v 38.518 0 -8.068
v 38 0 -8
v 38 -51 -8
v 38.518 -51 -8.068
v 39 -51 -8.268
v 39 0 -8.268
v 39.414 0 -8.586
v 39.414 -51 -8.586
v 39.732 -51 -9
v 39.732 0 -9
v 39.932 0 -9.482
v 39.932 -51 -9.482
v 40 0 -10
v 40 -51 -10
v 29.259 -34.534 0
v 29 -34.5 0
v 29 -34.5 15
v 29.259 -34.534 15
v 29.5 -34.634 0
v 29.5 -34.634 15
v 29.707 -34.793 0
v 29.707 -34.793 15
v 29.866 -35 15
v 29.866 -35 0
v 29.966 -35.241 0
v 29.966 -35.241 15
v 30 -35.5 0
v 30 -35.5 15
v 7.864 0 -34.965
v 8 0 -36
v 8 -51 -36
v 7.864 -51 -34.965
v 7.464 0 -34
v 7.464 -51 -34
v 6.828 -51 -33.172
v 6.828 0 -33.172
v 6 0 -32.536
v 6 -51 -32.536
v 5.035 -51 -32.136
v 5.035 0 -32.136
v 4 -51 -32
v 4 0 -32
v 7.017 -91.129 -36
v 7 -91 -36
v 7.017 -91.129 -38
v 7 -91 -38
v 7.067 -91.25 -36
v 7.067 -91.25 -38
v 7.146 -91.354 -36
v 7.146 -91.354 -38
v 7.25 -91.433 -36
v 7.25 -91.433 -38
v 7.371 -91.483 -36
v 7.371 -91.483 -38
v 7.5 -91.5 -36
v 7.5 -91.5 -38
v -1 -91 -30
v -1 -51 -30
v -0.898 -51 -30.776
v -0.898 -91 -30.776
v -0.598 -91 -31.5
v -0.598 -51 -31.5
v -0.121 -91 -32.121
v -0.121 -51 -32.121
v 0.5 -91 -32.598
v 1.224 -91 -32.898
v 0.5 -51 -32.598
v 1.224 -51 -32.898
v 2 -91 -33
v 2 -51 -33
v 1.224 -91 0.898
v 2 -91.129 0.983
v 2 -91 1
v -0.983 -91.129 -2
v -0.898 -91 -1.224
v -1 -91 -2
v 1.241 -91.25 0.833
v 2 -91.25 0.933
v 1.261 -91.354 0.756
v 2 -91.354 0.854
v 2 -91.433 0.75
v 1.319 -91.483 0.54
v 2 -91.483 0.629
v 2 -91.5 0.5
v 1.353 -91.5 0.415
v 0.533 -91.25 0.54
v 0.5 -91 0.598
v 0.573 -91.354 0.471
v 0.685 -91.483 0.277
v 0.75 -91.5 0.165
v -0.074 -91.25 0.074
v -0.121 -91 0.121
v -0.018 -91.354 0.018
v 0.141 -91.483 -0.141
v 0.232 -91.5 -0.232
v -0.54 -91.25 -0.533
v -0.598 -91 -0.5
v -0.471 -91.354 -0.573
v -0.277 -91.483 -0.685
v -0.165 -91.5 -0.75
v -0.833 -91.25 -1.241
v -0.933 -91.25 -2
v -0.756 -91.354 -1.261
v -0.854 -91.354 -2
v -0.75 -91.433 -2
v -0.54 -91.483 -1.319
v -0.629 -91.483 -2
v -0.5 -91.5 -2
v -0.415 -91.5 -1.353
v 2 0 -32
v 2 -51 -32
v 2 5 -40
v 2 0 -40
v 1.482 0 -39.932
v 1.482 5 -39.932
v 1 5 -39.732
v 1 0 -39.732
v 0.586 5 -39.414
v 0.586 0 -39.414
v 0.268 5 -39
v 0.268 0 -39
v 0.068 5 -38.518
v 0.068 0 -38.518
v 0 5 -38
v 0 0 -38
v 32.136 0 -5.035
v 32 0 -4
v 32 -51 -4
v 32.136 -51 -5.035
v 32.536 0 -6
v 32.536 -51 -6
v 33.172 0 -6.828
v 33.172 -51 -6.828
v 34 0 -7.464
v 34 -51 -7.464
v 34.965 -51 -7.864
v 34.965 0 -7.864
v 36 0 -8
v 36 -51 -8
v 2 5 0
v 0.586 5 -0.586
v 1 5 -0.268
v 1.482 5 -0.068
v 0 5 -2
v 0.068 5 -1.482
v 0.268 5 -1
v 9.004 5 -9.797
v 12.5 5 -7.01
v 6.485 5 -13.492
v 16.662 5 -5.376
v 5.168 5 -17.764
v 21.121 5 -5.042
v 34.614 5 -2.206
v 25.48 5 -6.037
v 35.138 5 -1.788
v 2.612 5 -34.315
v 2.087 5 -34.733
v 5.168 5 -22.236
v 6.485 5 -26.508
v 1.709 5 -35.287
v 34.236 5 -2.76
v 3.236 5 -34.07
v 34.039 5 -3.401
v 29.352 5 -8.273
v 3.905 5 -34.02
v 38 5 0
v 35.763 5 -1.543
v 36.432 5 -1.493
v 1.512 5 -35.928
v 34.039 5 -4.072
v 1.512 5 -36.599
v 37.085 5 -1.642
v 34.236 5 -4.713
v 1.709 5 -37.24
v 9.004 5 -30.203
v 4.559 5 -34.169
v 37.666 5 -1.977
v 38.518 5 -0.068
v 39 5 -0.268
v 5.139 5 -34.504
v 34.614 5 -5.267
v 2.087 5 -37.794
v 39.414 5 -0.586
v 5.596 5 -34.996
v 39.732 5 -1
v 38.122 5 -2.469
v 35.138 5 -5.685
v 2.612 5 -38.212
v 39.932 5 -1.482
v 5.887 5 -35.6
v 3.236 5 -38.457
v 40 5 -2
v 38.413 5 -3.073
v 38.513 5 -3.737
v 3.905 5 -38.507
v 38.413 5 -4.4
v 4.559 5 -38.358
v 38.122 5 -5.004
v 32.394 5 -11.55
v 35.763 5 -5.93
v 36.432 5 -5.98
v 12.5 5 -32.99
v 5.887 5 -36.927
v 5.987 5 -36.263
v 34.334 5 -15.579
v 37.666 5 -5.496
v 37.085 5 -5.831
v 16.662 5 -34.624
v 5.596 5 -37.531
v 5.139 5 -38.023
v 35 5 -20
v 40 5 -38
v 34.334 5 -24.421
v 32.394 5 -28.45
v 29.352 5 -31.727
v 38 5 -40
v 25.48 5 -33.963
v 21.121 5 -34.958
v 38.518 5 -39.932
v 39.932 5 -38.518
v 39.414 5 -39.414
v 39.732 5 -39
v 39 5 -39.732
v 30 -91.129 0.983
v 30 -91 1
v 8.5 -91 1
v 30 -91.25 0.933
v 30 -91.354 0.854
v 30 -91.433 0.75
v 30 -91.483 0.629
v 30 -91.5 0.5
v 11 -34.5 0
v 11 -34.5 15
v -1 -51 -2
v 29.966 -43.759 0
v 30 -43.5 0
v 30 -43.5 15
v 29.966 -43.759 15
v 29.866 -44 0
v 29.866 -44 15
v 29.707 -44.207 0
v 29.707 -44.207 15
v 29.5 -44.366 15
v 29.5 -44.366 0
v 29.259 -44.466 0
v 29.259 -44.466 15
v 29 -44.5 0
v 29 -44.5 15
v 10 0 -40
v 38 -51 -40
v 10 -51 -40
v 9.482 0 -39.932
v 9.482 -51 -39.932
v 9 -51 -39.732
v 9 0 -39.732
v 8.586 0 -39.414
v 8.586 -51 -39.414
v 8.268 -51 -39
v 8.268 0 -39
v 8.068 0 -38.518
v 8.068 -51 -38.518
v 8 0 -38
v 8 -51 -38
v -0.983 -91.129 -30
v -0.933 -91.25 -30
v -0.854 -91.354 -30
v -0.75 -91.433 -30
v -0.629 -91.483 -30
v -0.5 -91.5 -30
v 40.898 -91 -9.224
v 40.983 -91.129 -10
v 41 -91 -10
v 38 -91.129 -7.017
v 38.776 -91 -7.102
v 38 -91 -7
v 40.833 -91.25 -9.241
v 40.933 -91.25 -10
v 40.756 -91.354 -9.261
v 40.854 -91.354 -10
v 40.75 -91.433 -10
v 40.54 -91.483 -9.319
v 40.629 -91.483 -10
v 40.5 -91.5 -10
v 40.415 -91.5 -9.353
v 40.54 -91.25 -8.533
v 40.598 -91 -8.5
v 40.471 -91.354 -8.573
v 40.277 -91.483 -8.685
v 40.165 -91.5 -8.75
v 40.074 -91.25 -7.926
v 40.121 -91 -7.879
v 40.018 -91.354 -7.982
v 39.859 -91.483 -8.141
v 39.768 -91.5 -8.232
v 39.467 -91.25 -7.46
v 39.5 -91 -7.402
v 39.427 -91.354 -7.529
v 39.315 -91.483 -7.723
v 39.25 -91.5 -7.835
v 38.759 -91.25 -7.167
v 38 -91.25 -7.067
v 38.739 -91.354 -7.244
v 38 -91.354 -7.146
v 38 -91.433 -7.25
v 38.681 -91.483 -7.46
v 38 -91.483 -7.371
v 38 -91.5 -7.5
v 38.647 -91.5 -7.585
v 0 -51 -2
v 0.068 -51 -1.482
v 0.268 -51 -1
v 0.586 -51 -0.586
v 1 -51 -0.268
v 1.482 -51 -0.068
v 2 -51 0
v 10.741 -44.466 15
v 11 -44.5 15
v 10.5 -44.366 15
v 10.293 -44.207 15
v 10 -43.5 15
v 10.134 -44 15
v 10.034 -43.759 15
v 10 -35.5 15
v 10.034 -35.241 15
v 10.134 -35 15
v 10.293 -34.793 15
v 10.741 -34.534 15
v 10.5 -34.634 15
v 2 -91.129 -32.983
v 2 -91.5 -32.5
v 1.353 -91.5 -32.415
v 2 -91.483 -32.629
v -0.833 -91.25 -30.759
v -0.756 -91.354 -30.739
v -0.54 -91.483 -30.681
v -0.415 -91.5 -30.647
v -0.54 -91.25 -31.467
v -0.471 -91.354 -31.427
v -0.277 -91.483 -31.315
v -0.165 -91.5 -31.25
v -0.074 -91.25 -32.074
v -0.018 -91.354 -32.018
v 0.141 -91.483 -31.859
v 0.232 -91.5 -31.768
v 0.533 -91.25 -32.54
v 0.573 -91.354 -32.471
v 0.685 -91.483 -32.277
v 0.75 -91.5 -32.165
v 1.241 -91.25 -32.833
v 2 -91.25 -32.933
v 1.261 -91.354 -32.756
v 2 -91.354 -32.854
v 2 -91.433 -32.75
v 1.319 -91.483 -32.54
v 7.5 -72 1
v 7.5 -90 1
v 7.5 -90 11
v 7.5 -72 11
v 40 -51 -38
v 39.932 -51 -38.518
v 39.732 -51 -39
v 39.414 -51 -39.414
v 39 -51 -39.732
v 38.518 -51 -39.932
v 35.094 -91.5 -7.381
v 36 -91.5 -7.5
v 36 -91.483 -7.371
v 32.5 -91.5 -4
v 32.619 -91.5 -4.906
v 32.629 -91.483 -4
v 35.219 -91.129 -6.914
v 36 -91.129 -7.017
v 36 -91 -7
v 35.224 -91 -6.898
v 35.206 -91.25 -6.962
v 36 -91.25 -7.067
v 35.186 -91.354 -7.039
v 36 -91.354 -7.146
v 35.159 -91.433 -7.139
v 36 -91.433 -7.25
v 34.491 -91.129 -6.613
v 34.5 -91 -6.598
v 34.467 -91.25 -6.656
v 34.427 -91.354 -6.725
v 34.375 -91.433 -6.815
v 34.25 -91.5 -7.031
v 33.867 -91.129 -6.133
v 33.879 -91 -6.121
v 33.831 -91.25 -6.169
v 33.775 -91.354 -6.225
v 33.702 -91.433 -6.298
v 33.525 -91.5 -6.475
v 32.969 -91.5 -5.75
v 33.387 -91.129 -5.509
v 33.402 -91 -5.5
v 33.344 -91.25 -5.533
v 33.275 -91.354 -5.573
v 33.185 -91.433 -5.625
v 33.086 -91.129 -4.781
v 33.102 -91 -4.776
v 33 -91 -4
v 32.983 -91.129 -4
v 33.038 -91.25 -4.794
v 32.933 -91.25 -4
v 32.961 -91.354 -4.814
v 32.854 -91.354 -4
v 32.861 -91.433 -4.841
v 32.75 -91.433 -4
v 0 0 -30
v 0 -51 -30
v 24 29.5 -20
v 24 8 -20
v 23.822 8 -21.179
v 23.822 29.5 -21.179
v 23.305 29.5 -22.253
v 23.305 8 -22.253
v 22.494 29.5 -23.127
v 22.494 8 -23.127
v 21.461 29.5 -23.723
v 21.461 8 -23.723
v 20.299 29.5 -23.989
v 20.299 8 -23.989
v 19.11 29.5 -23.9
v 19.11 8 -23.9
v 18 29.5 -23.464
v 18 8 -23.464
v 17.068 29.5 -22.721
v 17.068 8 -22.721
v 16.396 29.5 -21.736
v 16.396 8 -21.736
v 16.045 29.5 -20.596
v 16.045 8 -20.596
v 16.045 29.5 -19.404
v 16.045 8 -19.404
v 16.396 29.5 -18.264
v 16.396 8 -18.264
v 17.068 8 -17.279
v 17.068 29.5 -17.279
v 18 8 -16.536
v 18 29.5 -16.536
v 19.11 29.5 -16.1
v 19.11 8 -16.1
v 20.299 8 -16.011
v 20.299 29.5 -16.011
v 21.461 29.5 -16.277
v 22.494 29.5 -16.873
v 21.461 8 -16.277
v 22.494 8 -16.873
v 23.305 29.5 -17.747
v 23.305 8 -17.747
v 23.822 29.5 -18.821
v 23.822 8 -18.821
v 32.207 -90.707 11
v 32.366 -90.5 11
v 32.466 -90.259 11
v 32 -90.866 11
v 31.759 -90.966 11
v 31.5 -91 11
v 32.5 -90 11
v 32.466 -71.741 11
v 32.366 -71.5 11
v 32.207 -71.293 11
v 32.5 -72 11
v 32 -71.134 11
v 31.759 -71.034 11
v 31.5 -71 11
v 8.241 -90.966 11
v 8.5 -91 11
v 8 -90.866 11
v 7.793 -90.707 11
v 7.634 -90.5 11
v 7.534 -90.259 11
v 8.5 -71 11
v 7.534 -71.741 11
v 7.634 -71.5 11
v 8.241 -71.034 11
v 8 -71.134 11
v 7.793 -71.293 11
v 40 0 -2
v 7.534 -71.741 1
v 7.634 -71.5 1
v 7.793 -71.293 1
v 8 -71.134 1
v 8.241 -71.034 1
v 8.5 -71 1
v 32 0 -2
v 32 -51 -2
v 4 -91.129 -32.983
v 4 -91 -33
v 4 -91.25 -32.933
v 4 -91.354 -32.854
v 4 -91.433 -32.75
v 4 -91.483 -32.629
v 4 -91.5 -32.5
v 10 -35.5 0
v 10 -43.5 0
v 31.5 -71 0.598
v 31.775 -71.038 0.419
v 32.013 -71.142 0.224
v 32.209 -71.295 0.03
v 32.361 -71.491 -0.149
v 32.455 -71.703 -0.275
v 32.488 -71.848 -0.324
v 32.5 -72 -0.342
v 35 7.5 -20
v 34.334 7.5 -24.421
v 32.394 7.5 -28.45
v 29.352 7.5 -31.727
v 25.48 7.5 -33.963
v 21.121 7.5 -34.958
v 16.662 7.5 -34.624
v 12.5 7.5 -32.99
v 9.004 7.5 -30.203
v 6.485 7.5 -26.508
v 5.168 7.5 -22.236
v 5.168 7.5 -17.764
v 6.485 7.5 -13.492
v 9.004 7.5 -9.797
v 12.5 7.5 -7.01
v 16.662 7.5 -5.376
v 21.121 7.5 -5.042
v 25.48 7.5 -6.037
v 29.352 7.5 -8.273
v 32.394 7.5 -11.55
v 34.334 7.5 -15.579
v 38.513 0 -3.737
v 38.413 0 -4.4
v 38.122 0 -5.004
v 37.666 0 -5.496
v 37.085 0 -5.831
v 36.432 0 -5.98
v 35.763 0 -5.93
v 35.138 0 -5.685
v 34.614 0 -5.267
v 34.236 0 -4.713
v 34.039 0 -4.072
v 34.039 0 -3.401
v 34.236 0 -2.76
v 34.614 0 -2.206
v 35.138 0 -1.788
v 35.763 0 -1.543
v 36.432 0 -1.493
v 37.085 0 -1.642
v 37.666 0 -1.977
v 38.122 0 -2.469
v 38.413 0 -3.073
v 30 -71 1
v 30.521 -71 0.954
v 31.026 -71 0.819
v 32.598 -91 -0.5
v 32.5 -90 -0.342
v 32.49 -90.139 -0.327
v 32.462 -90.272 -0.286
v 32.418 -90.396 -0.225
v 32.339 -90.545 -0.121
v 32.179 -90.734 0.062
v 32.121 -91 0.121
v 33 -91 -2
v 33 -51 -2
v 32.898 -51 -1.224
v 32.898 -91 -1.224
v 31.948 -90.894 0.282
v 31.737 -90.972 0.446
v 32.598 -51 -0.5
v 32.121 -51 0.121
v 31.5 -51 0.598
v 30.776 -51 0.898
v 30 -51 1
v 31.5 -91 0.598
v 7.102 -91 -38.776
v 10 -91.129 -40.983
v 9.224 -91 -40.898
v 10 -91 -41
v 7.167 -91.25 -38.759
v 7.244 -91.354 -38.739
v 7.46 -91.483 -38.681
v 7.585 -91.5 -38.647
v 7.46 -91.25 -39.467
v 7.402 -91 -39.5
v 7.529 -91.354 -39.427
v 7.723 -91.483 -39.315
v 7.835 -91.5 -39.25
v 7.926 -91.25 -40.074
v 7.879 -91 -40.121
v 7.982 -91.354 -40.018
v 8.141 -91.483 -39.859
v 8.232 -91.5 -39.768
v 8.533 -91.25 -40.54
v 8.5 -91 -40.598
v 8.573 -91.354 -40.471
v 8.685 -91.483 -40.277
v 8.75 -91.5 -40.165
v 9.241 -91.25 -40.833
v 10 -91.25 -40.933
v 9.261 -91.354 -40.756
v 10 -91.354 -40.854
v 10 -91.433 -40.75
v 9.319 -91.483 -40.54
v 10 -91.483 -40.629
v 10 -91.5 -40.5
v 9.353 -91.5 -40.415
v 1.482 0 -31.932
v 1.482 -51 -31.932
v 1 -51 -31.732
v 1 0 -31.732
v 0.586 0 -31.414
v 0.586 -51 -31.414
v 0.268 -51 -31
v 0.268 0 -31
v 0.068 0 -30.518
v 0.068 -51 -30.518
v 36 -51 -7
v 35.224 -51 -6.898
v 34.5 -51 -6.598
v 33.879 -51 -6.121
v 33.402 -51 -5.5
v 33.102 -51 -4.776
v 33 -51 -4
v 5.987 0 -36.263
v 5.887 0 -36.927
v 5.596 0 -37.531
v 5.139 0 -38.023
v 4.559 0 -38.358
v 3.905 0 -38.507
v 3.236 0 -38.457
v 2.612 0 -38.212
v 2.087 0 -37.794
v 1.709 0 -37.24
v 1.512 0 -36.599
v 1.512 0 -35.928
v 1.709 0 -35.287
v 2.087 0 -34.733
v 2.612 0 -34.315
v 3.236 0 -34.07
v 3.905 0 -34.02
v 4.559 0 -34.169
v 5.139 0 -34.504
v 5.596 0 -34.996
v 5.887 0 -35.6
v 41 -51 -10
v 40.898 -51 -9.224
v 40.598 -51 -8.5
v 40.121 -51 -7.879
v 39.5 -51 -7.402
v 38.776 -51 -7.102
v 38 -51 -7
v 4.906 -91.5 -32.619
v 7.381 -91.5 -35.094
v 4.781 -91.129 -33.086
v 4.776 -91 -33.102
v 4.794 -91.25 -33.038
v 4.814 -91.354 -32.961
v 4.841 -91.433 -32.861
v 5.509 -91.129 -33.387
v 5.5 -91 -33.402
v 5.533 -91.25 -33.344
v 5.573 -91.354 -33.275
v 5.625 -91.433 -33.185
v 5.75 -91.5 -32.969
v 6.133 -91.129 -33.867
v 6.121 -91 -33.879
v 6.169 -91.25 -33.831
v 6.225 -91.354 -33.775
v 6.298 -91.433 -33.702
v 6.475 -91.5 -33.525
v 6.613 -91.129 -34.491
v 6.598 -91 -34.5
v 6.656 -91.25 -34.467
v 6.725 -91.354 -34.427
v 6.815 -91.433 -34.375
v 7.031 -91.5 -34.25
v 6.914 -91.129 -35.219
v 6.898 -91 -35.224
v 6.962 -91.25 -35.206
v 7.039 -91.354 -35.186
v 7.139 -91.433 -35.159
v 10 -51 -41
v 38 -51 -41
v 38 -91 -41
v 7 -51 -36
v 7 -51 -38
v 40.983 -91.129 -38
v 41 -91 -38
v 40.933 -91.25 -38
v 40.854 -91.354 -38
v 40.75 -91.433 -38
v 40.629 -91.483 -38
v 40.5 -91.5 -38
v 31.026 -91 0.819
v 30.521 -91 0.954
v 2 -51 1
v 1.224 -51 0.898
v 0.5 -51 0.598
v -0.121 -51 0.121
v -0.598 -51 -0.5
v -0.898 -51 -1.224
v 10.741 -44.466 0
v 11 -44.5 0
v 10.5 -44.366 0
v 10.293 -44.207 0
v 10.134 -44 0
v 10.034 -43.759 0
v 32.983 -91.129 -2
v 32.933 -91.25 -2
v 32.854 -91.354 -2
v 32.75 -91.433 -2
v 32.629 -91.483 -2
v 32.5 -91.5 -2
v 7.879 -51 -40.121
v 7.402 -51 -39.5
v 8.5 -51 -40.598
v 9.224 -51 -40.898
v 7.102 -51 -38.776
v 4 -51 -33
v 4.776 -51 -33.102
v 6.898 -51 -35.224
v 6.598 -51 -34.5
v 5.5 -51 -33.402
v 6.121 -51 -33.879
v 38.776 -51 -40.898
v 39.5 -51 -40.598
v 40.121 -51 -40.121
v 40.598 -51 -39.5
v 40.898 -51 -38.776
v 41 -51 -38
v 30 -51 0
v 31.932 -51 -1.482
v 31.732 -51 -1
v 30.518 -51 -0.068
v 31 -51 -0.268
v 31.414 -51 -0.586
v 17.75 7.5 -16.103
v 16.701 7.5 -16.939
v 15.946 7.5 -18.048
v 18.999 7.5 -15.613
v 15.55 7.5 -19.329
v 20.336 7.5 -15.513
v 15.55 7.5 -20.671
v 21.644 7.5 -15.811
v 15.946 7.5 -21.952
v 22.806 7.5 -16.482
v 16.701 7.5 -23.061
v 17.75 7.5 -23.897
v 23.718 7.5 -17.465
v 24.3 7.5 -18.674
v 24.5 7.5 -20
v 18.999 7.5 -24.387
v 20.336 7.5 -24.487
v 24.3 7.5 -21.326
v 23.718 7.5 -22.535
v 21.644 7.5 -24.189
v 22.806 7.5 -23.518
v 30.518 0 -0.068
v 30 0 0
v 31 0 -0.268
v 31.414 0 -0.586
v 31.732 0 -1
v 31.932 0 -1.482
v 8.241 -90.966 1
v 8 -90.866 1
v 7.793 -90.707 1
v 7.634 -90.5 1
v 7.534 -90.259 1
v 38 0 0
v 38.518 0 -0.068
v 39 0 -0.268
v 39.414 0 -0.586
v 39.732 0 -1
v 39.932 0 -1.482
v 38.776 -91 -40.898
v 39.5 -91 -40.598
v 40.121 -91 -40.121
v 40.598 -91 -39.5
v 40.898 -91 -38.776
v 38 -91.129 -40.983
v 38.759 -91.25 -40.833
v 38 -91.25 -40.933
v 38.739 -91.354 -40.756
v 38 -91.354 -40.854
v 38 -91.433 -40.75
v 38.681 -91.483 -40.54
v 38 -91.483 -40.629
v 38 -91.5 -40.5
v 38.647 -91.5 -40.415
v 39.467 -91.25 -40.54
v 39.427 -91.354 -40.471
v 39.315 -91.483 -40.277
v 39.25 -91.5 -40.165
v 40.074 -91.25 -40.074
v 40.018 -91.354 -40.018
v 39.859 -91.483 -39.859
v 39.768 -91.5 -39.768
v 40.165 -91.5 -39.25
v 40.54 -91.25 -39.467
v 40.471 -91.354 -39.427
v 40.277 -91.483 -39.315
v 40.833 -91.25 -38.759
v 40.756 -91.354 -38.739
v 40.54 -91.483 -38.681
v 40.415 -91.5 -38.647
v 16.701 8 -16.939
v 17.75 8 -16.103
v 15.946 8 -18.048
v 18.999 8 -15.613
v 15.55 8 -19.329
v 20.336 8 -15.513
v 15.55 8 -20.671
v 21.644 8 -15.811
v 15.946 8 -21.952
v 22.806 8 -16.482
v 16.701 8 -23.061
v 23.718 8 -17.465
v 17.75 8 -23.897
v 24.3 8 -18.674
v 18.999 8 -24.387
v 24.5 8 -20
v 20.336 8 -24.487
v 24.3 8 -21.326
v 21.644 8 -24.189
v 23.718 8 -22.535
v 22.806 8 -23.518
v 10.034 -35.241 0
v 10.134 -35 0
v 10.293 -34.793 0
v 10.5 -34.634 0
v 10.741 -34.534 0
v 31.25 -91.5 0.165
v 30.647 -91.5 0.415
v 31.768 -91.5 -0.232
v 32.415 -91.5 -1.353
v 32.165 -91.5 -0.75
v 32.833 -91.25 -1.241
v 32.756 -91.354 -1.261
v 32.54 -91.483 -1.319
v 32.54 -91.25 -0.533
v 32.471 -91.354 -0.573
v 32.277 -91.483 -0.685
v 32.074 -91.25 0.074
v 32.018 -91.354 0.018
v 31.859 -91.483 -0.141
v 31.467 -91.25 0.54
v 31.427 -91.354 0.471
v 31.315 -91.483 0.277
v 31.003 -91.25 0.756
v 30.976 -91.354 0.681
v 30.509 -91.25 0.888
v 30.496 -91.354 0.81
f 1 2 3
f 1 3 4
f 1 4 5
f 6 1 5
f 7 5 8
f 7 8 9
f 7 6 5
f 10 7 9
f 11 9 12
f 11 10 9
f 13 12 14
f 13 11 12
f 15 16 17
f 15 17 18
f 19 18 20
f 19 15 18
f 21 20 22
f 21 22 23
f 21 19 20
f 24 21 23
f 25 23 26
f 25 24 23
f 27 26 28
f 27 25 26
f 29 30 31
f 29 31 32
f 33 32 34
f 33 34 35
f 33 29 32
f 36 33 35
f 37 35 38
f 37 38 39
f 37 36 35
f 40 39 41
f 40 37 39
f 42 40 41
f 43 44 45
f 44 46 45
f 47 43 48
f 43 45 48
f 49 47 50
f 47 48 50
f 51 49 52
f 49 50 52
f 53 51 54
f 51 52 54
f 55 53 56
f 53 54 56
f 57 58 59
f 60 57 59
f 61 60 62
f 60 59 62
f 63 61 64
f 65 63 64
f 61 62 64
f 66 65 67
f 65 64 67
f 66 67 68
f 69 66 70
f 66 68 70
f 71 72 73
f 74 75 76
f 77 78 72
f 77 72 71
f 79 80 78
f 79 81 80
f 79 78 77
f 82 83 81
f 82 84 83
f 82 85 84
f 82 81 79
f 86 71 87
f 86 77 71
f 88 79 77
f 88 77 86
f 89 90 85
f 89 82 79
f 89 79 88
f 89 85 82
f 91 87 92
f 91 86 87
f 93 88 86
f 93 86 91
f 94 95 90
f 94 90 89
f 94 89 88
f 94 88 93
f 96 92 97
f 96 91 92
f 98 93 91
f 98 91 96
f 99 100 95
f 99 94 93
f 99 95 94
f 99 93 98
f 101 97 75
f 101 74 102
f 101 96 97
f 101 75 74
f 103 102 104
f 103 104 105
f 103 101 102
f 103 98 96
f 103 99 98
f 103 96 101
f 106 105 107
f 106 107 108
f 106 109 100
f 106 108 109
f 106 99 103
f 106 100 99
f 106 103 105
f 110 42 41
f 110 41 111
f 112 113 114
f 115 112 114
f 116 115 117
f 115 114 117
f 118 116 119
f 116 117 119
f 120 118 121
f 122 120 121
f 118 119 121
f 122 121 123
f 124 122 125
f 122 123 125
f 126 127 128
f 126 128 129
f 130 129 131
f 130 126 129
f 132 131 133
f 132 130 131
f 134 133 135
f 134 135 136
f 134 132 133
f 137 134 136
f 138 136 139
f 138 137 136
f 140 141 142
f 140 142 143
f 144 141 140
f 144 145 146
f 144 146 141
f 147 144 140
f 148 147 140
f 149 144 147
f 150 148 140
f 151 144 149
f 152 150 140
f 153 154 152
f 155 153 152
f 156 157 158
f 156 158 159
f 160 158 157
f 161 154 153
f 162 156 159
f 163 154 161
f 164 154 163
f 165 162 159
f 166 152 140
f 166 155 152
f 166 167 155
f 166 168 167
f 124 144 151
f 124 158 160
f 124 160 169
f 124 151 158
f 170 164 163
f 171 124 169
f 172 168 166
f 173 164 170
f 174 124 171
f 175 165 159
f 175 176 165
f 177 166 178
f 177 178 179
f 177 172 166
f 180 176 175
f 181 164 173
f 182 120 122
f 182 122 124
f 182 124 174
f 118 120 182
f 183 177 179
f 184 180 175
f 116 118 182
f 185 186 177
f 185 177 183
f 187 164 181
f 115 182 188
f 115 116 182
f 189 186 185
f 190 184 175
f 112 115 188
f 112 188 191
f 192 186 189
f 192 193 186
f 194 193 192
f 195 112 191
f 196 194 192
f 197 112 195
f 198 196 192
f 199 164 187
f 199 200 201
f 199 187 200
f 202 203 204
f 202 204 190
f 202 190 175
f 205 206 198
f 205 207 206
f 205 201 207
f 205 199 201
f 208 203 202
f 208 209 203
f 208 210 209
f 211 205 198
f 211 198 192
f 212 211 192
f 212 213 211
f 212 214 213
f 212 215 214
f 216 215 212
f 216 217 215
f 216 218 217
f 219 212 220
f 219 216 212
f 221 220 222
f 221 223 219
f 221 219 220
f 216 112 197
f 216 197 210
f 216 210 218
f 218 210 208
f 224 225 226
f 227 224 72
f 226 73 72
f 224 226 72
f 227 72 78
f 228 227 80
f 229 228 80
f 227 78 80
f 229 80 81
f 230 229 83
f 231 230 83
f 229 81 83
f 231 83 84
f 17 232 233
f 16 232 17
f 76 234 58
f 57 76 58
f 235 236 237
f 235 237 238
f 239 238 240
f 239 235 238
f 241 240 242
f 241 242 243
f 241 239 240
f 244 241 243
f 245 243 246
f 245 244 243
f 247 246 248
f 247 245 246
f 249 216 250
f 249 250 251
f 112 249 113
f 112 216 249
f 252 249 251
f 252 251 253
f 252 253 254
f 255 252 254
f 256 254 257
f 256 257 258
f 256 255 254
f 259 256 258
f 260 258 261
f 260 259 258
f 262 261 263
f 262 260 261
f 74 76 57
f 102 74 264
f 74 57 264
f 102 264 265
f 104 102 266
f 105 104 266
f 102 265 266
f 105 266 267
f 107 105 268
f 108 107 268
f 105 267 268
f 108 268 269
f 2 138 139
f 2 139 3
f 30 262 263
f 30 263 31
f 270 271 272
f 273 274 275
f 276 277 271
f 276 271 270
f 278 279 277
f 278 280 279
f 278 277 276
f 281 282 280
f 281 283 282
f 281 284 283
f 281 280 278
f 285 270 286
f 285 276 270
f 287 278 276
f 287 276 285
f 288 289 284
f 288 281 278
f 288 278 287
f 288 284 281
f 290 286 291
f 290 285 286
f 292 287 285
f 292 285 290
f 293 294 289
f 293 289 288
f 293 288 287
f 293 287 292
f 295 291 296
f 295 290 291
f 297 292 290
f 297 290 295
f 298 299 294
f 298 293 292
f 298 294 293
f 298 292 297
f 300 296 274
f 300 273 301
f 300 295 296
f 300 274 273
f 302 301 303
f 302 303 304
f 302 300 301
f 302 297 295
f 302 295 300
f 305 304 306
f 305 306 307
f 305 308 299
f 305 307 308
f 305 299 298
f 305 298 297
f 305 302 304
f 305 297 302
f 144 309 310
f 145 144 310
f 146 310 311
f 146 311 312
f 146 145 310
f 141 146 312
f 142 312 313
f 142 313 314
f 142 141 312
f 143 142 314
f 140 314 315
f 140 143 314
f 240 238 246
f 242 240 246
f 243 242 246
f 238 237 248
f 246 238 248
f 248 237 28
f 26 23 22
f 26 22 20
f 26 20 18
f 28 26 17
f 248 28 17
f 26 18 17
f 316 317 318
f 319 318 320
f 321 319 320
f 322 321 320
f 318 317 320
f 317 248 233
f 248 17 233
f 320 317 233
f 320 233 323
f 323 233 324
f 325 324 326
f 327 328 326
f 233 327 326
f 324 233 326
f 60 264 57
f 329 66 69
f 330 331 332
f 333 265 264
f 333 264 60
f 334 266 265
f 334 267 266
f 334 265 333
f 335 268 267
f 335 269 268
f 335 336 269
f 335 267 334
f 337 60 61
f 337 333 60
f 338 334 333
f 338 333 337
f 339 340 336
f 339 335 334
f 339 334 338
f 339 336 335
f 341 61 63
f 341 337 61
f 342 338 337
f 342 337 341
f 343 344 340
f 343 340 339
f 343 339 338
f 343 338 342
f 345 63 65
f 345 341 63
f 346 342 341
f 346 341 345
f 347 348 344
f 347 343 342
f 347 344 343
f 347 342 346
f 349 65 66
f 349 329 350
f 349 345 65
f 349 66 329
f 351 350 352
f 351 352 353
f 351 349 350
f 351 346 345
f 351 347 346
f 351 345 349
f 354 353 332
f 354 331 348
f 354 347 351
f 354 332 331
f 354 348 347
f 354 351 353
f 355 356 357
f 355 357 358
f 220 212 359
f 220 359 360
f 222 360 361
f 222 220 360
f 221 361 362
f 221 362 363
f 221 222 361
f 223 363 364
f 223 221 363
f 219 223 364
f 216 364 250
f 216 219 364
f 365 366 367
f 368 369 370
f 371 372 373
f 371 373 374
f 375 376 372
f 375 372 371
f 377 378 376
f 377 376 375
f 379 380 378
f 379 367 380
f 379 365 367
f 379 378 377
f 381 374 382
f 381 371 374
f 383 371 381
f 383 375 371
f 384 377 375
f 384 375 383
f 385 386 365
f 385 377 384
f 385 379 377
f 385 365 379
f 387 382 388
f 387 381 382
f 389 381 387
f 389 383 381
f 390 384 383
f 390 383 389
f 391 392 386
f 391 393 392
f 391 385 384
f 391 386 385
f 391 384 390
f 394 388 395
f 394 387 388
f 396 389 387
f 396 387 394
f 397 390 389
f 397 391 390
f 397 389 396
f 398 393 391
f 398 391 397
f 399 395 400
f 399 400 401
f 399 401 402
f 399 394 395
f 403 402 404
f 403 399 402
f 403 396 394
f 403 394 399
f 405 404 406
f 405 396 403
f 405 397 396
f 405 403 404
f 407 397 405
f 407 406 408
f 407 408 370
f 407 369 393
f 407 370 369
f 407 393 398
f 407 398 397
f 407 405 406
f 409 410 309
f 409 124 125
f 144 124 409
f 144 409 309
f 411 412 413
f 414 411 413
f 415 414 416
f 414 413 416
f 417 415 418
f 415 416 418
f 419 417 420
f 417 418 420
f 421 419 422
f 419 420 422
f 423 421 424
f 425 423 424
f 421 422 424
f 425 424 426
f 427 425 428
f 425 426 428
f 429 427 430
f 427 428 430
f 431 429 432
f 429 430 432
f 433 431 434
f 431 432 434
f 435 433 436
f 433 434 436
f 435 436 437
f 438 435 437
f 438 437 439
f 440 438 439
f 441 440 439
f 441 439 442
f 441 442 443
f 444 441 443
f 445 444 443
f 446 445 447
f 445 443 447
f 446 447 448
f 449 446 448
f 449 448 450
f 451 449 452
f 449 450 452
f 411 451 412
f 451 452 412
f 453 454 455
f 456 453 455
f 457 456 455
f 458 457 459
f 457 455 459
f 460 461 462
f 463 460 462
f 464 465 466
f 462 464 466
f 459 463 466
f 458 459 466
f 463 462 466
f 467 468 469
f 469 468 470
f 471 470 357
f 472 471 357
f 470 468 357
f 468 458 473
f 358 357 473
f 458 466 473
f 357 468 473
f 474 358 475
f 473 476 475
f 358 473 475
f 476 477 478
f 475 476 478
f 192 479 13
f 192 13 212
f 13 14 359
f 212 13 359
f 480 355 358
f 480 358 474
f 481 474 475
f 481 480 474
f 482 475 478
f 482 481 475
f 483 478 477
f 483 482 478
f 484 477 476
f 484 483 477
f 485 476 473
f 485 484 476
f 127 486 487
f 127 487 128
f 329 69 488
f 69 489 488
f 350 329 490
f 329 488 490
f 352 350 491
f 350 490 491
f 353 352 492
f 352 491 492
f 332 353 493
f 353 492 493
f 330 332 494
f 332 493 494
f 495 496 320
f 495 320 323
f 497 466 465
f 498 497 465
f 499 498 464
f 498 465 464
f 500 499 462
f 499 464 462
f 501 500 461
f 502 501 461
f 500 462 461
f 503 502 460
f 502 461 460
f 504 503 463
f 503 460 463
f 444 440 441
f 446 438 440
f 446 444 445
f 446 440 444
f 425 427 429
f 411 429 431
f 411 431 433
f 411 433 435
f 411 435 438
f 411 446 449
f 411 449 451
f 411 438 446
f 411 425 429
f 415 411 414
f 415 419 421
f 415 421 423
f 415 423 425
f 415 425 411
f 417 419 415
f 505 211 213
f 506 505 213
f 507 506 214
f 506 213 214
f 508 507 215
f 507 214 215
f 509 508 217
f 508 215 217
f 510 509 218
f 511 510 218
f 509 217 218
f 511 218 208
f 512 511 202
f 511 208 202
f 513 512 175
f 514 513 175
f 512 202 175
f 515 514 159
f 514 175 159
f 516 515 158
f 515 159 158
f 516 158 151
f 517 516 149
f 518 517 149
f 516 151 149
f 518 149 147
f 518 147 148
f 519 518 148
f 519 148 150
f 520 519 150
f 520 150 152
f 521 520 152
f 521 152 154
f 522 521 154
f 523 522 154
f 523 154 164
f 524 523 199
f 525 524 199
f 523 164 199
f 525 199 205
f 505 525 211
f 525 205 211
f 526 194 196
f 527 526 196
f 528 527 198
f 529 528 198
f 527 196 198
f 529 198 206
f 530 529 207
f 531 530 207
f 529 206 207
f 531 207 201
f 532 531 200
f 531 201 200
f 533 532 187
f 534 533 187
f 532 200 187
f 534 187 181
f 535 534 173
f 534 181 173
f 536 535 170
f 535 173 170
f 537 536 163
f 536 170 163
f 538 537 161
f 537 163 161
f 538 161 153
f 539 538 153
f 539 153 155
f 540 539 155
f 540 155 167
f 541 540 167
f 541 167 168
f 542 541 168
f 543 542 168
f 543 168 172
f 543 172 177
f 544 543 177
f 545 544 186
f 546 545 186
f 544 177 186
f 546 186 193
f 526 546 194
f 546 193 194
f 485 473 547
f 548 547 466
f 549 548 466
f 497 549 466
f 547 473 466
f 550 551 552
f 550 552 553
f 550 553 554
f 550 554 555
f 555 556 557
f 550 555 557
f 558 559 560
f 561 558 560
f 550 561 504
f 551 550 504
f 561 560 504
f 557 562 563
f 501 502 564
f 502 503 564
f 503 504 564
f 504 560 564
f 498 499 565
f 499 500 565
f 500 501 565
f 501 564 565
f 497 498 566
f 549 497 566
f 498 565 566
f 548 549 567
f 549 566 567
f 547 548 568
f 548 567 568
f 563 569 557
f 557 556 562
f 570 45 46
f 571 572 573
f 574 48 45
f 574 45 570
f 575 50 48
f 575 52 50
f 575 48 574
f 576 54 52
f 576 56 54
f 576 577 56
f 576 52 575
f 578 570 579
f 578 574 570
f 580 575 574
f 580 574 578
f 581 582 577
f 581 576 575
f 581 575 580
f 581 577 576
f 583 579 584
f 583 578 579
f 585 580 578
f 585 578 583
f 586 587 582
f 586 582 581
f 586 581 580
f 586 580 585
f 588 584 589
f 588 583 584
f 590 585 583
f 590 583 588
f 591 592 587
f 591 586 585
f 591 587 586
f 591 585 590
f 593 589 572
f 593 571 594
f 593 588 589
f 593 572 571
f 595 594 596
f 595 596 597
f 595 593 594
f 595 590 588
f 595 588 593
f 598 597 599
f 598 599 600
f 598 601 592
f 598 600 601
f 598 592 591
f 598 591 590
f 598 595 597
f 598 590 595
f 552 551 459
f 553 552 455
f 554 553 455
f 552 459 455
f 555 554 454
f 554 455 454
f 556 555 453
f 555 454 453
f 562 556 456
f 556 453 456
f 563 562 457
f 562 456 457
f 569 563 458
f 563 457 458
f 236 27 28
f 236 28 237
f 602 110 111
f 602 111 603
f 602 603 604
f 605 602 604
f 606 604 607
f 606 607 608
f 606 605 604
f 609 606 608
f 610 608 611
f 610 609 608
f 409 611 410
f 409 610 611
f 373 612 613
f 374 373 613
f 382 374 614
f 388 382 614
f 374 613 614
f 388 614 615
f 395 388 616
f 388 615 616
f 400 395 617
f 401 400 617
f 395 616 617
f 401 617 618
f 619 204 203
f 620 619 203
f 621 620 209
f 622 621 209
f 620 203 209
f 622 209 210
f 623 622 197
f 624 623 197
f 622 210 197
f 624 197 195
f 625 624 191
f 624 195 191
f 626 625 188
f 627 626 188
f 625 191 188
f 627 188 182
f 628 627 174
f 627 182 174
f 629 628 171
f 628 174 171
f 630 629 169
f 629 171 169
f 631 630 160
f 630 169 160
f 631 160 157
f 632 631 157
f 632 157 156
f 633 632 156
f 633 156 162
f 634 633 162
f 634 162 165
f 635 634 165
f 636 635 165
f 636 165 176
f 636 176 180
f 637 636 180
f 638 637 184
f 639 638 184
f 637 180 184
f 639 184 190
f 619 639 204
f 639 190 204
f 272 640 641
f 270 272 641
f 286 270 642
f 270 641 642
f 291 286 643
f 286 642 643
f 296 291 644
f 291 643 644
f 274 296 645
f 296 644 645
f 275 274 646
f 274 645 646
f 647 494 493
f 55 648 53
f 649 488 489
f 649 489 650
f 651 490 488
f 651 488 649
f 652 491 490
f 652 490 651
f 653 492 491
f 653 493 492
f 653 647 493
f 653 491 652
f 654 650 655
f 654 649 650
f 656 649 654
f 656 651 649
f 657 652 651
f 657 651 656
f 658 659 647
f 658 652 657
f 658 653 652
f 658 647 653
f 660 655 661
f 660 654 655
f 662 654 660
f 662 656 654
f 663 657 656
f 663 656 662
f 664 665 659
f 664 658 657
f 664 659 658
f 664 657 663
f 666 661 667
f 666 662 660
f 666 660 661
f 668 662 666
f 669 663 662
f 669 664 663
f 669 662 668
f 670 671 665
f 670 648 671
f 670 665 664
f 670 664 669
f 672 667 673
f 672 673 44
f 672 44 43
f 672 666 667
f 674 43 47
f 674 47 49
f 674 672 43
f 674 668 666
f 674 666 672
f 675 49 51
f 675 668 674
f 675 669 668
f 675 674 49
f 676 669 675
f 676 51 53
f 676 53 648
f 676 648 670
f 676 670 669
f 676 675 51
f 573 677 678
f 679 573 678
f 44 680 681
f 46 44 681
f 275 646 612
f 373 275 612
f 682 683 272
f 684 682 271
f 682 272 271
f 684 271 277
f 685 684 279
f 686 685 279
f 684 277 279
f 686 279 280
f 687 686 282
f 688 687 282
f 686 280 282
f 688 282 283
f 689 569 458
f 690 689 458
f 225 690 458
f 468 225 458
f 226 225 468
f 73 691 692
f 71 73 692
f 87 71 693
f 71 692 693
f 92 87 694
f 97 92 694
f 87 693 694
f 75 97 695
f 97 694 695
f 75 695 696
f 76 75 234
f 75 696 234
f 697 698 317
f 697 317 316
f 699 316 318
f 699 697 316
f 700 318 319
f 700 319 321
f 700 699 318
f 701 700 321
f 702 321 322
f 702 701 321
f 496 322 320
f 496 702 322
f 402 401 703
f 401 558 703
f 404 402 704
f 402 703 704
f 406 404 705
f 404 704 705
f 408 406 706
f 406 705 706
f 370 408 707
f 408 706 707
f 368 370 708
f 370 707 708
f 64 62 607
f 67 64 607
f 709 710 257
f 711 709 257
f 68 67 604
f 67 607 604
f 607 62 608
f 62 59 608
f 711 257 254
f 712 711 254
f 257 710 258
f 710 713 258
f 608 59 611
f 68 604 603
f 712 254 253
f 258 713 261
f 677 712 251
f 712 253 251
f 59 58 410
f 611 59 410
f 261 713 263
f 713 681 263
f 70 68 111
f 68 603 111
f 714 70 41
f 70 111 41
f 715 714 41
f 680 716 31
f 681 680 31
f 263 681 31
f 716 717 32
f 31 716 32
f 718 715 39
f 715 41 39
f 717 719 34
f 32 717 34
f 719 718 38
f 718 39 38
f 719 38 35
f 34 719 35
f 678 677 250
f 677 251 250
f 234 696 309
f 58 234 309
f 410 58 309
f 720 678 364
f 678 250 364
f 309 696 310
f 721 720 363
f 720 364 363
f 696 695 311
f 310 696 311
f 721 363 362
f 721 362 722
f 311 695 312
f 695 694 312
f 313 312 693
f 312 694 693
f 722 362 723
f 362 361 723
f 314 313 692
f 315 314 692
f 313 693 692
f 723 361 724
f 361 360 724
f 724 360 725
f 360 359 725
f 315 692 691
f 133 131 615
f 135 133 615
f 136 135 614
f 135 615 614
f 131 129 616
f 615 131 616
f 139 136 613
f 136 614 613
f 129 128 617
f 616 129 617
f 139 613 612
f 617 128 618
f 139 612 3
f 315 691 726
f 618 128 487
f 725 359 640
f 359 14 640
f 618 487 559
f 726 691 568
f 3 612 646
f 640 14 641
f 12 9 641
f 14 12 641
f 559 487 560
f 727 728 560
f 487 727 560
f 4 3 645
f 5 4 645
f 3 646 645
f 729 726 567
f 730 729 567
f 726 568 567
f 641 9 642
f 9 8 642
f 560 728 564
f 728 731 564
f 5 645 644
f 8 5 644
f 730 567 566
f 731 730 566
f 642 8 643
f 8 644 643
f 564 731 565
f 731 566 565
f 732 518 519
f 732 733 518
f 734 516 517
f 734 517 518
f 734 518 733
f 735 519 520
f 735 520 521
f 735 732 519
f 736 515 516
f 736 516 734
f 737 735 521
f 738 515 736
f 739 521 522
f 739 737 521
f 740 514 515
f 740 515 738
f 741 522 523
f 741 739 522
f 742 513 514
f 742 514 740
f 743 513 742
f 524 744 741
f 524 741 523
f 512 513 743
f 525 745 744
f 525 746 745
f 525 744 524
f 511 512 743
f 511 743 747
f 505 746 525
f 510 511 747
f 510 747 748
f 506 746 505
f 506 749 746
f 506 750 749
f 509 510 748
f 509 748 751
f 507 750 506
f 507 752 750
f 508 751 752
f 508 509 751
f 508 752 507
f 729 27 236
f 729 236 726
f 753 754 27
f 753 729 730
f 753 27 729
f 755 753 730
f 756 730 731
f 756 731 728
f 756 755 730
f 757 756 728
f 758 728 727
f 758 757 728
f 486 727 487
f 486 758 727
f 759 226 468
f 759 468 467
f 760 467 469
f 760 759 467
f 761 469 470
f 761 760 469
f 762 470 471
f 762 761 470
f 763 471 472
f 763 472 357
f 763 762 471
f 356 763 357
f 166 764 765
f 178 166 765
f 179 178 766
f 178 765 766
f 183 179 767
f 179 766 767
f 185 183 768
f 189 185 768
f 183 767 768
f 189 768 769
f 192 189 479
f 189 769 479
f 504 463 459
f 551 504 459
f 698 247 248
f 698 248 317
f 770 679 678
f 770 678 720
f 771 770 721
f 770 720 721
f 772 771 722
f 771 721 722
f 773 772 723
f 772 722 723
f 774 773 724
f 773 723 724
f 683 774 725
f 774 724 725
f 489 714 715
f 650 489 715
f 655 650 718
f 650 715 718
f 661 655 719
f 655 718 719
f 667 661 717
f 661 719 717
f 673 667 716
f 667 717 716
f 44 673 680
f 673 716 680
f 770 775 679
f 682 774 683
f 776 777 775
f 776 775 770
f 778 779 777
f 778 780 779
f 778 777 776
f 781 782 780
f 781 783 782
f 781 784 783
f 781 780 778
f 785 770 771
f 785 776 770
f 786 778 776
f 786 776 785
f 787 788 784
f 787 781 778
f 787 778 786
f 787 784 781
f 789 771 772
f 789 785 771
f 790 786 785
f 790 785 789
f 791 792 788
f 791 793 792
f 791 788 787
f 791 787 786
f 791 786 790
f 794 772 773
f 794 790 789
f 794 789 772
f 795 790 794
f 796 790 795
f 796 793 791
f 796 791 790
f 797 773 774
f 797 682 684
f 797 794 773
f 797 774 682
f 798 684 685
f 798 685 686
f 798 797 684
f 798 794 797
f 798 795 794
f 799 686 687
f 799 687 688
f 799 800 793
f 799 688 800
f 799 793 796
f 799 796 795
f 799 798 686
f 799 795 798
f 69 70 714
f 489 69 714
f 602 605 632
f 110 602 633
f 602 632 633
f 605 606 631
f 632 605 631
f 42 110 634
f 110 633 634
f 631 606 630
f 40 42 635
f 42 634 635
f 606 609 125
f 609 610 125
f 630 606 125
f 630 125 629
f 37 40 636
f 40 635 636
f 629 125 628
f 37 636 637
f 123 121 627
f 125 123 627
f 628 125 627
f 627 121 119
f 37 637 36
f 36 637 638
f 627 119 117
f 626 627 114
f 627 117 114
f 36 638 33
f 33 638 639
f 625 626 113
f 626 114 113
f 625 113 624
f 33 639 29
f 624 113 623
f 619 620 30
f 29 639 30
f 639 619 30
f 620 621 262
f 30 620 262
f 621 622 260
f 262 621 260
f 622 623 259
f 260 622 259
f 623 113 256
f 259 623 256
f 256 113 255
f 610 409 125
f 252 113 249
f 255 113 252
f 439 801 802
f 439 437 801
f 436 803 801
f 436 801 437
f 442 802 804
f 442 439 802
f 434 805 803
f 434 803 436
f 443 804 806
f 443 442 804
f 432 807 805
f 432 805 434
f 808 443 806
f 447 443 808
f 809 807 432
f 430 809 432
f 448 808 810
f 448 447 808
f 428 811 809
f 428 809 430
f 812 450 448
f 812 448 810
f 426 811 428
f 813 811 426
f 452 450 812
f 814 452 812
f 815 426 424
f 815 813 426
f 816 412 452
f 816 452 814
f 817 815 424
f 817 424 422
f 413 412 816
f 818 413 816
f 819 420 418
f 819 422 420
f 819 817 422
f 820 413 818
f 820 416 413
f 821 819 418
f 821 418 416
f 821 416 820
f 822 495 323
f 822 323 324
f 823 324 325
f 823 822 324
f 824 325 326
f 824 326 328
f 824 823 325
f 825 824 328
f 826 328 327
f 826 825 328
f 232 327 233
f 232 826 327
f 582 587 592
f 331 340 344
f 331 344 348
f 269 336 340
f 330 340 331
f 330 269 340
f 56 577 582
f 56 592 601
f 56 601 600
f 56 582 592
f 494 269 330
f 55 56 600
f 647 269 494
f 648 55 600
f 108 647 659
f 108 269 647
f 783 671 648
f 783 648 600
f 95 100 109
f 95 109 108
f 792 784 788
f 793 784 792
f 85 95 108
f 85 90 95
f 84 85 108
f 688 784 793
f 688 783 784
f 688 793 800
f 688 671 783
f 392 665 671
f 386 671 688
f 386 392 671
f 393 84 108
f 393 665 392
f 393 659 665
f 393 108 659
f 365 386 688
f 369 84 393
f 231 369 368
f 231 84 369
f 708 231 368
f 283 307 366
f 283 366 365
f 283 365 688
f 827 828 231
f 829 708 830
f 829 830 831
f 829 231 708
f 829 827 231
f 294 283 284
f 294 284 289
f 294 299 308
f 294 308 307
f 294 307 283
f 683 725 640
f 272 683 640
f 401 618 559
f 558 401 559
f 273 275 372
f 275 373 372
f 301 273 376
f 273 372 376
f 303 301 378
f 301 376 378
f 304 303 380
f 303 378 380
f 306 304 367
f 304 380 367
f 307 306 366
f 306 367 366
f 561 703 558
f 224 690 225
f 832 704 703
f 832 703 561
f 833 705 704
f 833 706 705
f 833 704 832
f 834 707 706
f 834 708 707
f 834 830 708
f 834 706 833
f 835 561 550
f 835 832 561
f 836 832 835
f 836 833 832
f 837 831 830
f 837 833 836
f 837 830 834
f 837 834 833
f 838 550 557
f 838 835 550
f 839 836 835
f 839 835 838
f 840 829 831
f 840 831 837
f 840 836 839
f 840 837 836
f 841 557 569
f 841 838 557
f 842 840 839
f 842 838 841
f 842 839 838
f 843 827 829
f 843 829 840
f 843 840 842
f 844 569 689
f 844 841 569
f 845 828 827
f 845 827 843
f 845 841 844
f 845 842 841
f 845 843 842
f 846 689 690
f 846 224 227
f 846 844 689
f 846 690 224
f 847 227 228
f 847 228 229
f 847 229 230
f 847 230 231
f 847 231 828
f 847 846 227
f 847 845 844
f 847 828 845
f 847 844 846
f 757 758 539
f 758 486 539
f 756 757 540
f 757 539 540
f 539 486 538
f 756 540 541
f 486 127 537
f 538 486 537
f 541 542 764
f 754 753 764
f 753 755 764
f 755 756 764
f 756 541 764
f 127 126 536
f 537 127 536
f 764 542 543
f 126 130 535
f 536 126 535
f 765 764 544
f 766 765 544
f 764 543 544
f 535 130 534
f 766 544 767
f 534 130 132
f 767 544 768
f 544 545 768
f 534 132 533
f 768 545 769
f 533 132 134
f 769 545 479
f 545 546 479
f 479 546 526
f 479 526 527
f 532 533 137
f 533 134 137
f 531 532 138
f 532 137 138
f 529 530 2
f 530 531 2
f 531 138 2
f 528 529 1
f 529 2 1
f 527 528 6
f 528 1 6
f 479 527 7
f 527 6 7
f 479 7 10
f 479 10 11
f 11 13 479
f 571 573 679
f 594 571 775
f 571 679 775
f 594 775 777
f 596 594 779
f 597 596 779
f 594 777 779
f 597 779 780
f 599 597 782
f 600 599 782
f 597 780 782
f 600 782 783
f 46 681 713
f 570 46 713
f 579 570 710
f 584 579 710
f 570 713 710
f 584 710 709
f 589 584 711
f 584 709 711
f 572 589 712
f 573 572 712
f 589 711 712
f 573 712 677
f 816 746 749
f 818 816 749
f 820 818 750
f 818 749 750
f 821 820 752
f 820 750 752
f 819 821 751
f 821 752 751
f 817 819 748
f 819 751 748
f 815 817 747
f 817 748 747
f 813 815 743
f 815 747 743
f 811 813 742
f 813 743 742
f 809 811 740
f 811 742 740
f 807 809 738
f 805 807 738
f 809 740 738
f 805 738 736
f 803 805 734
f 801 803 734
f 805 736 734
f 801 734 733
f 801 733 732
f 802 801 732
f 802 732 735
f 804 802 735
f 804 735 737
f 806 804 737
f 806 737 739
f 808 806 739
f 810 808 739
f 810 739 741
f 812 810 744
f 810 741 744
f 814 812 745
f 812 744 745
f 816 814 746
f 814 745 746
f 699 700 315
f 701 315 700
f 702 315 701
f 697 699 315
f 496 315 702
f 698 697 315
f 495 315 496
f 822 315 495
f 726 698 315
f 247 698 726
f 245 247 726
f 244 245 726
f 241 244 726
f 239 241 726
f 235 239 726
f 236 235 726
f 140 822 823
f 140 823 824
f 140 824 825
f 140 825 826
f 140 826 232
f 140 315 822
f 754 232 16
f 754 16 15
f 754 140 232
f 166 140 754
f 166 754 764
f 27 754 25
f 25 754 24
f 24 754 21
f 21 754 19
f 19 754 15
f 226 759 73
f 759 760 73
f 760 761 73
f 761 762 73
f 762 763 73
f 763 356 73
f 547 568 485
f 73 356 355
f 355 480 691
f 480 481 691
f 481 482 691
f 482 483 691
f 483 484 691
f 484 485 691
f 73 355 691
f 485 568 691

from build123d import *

# Parameters (mm, degrees)
BOSS_EXTRUDE1_DEPTH             = 5
SKETCH2_R                       = 15
BOSS_EXTRUDE2_DEPTH             = 2.5
SKETCH3_R                       = 2.25
CUT_EXTRUDE1_DEPTH              = 5
BOSS_EXTRUDE3_DEPTH             = 51
BOSS_EXTRUDE4_DEPTH             = 40.5
SKETCH6_R                       = 4.5
BOSS_EXTRUDE5_DEPTH             = 0.5
SKETCH7_R                       = 4
BOSS_EXTRUDE6_DEPTH             = 21.5
FILLET1_R                       = 0.5
BOSS_EXTRUDE7_DEPTH             = 15
BOSS_EXTRUDE8_DEPTH             = 10
BOSS_EXTRUDE8_DIRECTION_2_REACH = 44


with BuildPart() as part:
    # Sketch1 → Boss-Extrude1 (new body)
    with BuildSketch(Plane(origin=(0, 0, 0), x_dir=(1, 0, 0), z_dir=(0, 1, 0))):
        with BuildLine():
            Line((2, 0), (38, 0))
            ThreePointArc((38, 0), (39.414213562, 0.585786438), (40, 2))
            Line((40, 2), (40, 38))
            ThreePointArc((40, 38), (39.414213562, 39.414213562), (38, 40))
            Line((38, 40), (2, 40))
            ThreePointArc((2, 40), (0.585786438, 39.414213562), (0, 38))
            Line((0, 38), (0, 2))
            ThreePointArc((0, 2), (0.585786438, 0.585786438), (2, 0))
        make_face()
    extrude(amount=BOSS_EXTRUDE1_DEPTH)

    # Sketch2 → Boss-Extrude2 (add)
    with BuildSketch(Plane(origin=(0, 5, 0), x_dir=(1, 0, 0), z_dir=(0, 1, 0))):
        with Locations((20, 20)):
            Circle(SKETCH2_R)
    extrude(amount=BOSS_EXTRUDE2_DEPTH)

    # Sketch3 → Cut-Extrude1 (cut)
    with BuildSketch(Plane(origin=(0, 5, 0), x_dir=(1, 0, 0), z_dir=(0, 1, 0))):
        with Locations((3.736544033, 36.263455967)):
            Circle(SKETCH3_R)
        with Locations((36.263455967, 3.736544033)):
            Circle(SKETCH3_R)
    extrude(amount=-CUT_EXTRUDE1_DEPTH, mode=Mode.SUBTRACT)

    # Sketch4 → Boss-Extrude3 (add)
    with BuildSketch(Plane.XZ):
        with BuildLine():
            Line((32, -2), (32, -4))
            ThreePointArc((32, -4), (33.171572875, -6.828427125), (36, -8))
            Line((36, -8), (38, -8))
            ThreePointArc((38, -8), (39.414213562, -8.585786438), (40, -10))
            Line((40, -10), (40, -38))
            ThreePointArc((40, -38), (39.414213562, -39.414213562), (38, -40))
            Line((38, -40), (10, -40))
            ThreePointArc((10, -40), (8.585786438, -39.414213562), (8, -38))
            Line((8, -38), (8, -36))
            ThreePointArc((8, -36), (6.828427125, -33.171572875), (4, -32))
            Line((4, -32), (2, -32))
            ThreePointArc((2, -32), (0.585786438, -31.414213562), (0, -30))
            Line((0, -30), (0, -2))
            ThreePointArc((0, -2), (0.585786438, -0.585786438), (2, 0))
            Line((2, 0), (30, 0))
            ThreePointArc((30, 0), (31.414213562, -0.585786438), (32, -2))
        make_face()
    extrude(amount=BOSS_EXTRUDE3_DEPTH)

    # Sketch5 → Boss-Extrude4 (add)
    with BuildSketch(Plane.XZ.offset(51)):
        with BuildLine():
            Line((10, -41), (38, -41))
            ThreePointArc((38, -41), (40.121320344, -40.121320344), (41, -38))
            Line((41, -38), (41, -10))
            ThreePointArc((41, -10), (40.121320344, -7.878679656), (38, -7))
            Line((38, -7), (36, -7))
            ThreePointArc((36, -7), (33.878679656, -6.121320344), (33, -4))
            Line((33, -4), (33, -2))
            ThreePointArc((33, -2), (32.121320344, 0.121320344), (30, 1))
            Line((30, 1), (2, 1))
            ThreePointArc((2, 1), (-0.121320344, 0.121320344), (-1, -2))
            Line((-1, -2), (-1, -30))
            ThreePointArc((-1, -30), (-0.121320344, -32.121320344), (2, -33))
            Line((2, -33), (4, -33))
            ThreePointArc((4, -33), (6.121320344, -33.878679656), (7, -36))
            Line((7, -36), (7, -38))
            ThreePointArc((7, -38), (7.878679656, -40.121320344), (10, -41))
        make_face()
    extrude(amount=BOSS_EXTRUDE4_DEPTH)

    # Sketch6 → Boss-Extrude5 (add)
    with BuildSketch(Plane(origin=(0, 7.5, 0), x_dir=(1, 0, 0), z_dir=(0, 1, 0))):
        with Locations((20, 20)):
            Circle(SKETCH6_R)
    extrude(amount=BOSS_EXTRUDE5_DEPTH)

    # Sketch7 → Boss-Extrude6 (add)
    with BuildSketch(Plane(origin=(0, 8, 0), x_dir=(1, 0, 0), z_dir=(0, 1, 0))):
        with Locations((20, 20)):
            Circle(SKETCH7_R)
    extrude(amount=BOSS_EXTRUDE6_DEPTH)

    # Fillet1
    fillet1_edges = [part.edges().sort_by_distance(p)[0] for p in [
        (7.878679656, -91.5, -40.121320344),
        (24, -91.5, -41),
        (40.121320344, -91.5, -40.121320344),
        (41, -91.5, -24),
        (40.121320344, -91.5, -7.878679656),
        (37, -91.5, -7),
        (33.878679656, -91.5, -6.121320344),
        (33, -91.5, -3),
        (32.121320344, -91.5, 0.121320344),
        (16, -91.5, 1),
        (-0.121320344, -91.5, 0.121320344),
        (-1, -91.5, -16),
        (-0.121320344, -91.5, -32.121320344),
        (3, -91.5, -33),
        (6.121320344, -91.5, -33.878679656),
        (7, -91.5, -37),
    ]]
    fillet(fillet1_edges, radius=FILLET1_R)

    # Sketch8 → Boss-Extrude7 (add)
    with BuildSketch(Plane.XY):
        with BuildLine():
            Line((11, -34.5), (29, -34.5))
            ThreePointArc((29, -34.5), (29.707106781, -34.792893219), (30, -35.5))
            Line((30, -35.5), (30, -43.5))
            ThreePointArc((30, -43.5), (29.707106781, -44.207106781), (29, -44.5))
            Line((29, -44.5), (11, -44.5))
            ThreePointArc((11, -44.5), (10.292893219, -44.207106781), (10, -43.5))
            Line((10, -43.5), (10, -35.5))
            ThreePointArc((10, -35.5), (10.292893219, -34.792893219), (11, -34.5))
        make_face()
    extrude(amount=BOSS_EXTRUDE7_DEPTH)

    # Sketch9 → Boss-Extrude8 (add)
    with BuildSketch(Plane.XY.offset(1)):
        with BuildLine():
            Line((8.5, -71), (31.5, -71))
            ThreePointArc((31.5, -71), (32.207106781, -71.292893219), (32.5, -72))
            Line((32.5, -72), (32.5, -90))
            ThreePointArc((32.5, -90), (32.207106781, -90.707106781), (31.5, -91))
            Line((31.5, -91), (8.5, -91))
            ThreePointArc((8.5, -91), (7.792893219, -90.707106781), (7.5, -90))
            Line((7.5, -90), (7.5, -72))
            ThreePointArc((7.5, -72), (7.792893219, -71.292893219), (8.5, -71))
        make_face()
    extrude(amount=BOSS_EXTRUDE8_DEPTH)

    # Sketch9 → Boss-Extrude8 direction 2 (add, up to next)
    with BuildSketch(Plane.XY.offset(1), mode=Mode.PRIVATE) as boss_extrude8_direction_2_sk1:
        with BuildLine():
            Line((8.5, -71), (31.5, -71))
            ThreePointArc((31.5, -71), (32.207106781, -71.292893219), (32.5, -72))
            Line((32.5, -72), (32.5, -90))
            ThreePointArc((32.5, -90), (32.207106781, -90.707106781), (31.5, -91))
            Line((31.5, -91), (8.5, -91))
            ThreePointArc((8.5, -91), (7.792893219, -90.707106781), (7.5, -90))
            Line((7.5, -90), (7.5, -72))
            ThreePointArc((7.5, -72), (7.792893219, -71.292893219), (8.5, -71))
        make_face()
    boss_extrude8_direction_2_tool1 = extrude(boss_extrude8_direction_2_sk1.sketch, amount=-BOSS_EXTRUDE8_DIRECTION_2_REACH, mode=Mode.PRIVATE) - part.part
    add(boss_extrude8_direction_2_tool1.solids().sort_by_distance((20, -81, 1))[0])


solid = part.part
